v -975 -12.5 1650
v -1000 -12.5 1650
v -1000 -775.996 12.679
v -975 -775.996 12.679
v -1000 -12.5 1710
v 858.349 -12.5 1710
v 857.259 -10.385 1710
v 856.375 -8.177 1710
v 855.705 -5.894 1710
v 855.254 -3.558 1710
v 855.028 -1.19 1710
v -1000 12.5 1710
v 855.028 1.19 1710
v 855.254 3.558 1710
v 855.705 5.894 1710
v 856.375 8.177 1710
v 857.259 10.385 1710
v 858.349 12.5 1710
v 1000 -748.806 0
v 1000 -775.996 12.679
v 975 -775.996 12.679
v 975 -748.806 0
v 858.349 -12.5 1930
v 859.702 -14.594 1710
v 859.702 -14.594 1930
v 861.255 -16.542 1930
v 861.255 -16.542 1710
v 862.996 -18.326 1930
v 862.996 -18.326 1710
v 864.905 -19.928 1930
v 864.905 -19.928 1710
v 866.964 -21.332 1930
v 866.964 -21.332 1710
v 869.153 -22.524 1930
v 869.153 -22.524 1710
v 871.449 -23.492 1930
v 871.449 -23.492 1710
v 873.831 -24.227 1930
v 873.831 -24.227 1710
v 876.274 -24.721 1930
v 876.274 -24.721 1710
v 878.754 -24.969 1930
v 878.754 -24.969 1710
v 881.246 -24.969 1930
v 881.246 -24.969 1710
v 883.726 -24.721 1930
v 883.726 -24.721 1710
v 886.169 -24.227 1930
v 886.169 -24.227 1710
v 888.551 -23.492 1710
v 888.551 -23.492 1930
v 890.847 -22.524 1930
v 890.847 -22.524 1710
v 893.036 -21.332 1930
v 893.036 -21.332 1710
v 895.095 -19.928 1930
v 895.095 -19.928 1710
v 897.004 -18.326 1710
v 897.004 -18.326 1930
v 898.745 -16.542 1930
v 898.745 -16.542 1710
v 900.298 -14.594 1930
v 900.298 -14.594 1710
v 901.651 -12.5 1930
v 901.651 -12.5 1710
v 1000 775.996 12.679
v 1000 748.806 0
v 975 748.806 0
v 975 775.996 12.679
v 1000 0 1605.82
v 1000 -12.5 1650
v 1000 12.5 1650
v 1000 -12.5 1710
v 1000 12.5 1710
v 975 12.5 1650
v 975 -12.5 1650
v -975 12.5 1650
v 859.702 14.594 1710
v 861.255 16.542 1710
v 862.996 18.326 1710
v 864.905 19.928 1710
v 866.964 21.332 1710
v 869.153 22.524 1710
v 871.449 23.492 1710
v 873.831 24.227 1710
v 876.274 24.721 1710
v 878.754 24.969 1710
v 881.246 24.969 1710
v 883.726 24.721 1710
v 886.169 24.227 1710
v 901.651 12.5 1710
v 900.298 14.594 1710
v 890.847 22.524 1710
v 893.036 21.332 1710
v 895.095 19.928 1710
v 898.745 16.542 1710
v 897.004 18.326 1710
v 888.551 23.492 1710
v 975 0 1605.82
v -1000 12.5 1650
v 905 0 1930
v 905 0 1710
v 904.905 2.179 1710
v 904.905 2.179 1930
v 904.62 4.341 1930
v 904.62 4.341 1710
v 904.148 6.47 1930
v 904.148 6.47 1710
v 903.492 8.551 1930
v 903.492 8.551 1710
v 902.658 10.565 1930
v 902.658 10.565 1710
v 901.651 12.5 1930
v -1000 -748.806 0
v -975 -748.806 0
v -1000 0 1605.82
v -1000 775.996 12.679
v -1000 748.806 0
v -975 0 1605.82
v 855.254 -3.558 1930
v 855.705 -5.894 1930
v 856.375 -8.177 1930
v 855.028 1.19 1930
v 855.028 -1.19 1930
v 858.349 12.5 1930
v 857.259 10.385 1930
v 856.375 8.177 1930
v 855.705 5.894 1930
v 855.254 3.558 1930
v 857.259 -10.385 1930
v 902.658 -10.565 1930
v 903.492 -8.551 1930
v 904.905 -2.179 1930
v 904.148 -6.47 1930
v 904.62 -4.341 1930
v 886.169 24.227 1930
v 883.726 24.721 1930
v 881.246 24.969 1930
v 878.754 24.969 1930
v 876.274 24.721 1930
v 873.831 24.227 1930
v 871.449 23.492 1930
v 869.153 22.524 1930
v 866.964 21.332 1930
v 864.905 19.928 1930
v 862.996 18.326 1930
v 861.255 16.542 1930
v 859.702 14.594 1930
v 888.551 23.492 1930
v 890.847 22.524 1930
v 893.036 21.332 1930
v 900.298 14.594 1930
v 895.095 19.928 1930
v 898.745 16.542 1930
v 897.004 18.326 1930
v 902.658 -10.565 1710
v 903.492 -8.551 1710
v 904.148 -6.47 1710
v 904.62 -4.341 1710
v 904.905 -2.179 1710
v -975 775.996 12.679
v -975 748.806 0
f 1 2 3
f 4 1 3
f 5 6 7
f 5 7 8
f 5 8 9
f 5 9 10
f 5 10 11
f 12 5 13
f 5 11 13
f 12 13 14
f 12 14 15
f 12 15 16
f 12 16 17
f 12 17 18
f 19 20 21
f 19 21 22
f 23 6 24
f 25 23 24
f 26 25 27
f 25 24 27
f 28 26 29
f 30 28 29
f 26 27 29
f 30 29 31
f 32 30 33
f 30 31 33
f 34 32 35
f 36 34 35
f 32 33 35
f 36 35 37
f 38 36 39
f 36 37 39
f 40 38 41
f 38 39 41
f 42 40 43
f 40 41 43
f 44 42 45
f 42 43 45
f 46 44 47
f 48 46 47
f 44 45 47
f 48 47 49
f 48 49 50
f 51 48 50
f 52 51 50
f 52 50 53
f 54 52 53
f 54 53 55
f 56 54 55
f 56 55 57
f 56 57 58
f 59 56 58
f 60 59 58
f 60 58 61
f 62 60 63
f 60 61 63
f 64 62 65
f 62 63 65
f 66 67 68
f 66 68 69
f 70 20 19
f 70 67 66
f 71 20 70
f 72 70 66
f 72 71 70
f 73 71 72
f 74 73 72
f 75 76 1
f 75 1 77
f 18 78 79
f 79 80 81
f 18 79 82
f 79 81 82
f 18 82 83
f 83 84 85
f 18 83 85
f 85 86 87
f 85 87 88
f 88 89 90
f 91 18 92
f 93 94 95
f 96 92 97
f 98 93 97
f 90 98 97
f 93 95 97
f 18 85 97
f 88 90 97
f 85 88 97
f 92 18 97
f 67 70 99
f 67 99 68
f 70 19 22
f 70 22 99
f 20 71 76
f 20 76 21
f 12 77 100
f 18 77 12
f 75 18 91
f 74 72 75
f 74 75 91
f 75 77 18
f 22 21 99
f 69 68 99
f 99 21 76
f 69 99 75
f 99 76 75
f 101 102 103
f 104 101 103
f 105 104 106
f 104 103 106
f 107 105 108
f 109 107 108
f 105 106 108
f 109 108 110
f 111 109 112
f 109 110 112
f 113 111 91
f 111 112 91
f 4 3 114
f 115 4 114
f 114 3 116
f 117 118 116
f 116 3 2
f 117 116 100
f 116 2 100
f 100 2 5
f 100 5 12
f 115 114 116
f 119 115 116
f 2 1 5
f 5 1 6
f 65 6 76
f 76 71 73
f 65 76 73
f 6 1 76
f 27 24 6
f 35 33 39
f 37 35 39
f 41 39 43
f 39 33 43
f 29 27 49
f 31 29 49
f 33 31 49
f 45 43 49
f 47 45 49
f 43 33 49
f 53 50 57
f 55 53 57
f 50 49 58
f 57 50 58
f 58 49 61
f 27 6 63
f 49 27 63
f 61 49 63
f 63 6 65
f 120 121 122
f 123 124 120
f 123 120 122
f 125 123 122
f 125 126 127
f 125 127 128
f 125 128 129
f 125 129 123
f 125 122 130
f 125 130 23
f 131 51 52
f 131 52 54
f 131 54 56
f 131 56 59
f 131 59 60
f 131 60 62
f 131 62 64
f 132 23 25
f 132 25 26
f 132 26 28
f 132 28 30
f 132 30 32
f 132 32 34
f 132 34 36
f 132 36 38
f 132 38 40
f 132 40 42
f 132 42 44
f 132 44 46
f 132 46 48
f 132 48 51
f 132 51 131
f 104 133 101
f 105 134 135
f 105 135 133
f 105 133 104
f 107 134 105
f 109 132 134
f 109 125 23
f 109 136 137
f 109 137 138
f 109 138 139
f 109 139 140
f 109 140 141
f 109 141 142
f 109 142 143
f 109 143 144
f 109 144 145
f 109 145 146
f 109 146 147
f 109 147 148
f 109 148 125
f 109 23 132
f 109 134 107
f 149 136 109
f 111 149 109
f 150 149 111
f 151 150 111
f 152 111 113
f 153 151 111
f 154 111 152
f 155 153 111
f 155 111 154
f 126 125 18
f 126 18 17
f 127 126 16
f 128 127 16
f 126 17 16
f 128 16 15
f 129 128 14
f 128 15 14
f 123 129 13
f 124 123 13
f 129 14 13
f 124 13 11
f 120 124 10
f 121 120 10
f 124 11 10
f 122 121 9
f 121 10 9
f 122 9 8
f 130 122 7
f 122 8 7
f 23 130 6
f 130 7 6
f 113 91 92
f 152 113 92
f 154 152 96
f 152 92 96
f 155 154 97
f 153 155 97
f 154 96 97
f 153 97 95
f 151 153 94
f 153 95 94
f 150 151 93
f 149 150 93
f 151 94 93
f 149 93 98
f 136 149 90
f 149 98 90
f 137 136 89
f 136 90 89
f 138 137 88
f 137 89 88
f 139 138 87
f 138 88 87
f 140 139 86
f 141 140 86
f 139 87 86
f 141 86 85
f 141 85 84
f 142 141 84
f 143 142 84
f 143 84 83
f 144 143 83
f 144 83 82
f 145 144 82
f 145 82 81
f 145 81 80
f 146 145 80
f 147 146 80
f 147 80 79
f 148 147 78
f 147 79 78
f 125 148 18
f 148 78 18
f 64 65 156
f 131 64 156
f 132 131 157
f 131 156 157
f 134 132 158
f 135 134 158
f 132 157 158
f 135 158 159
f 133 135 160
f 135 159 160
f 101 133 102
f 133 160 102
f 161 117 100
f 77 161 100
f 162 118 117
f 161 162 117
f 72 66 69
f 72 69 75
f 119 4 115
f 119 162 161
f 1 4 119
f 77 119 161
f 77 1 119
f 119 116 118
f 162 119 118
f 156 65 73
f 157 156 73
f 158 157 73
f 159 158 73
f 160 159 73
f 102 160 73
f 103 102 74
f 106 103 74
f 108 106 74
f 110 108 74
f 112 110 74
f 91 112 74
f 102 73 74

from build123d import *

# Parameters (mm, degrees)
F0_W     = 25
F0_H     = 60
F1_DEPTH = 1000
F3_DEPTH = 25
F6_DEPTH = 220


with BuildPart() as f1:
    # F0 (on Right) → F1 (new body, symmetric)
    with BuildSketch(Plane.YZ):
        with Locations((0, 1680)):
            Rectangle(F0_W, F0_H)
    extrude(amount=F1_DEPTH, both=True)

    # F2 (on face) → F3 (join)
    with BuildSketch(Plane.YZ.offset(1000)):
        Polygon((12.5, 1650), (-12.5, 1650), (-775.995531998, 12.6785478522), (-748.8062983869, 0), (0, 1605.8202890118), (748.8062983869, 0), (775.995531998, 12.6785478522), align=None)
    extrude(amount=-F3_DEPTH)

    # F4: F1 across plane


with BuildPart() as f1_1:
    add(f1.part)
    add(f1.part.mirror(Plane.YZ))

    # F5 (on face) → F6 (join)
    with BuildSketch(Plane.XY.offset(1710)):
        with BuildLine():
            ThreePointArc((901.6506350946, -12.5), (904.1481456572, -6.4704761276), (905, 0))
            ThreePointArc((905, 0), (904.1481456572, 6.4704761276), (901.6506350946, 12.5))
            Line((901.6506350946, 12.5), (858.3493649054, 12.5))
            ThreePointArc((858.3493649054, 12.5), (855, 0), (858.3493649054, -12.5))
            Line((858.3493649054, -12.5), (901.6506350946, -12.5))
        make_face()
        with BuildLine():
            Line((858.3493649054, 12.5), (901.6506350946, 12.5))
            ThreePointArc((901.6506350946, 12.5), (880, 25), (858.3493649054, 12.5))
        make_face()
        with BuildLine():
            ThreePointArc((858.3493649054, -12.5), (880, -25), (901.6506350946, -12.5))
            Line((901.6506350946, -12.5), (858.3493649054, -12.5))
        make_face()
    extrude(amount=F6_DEPTH)


solid = f1_1.part
